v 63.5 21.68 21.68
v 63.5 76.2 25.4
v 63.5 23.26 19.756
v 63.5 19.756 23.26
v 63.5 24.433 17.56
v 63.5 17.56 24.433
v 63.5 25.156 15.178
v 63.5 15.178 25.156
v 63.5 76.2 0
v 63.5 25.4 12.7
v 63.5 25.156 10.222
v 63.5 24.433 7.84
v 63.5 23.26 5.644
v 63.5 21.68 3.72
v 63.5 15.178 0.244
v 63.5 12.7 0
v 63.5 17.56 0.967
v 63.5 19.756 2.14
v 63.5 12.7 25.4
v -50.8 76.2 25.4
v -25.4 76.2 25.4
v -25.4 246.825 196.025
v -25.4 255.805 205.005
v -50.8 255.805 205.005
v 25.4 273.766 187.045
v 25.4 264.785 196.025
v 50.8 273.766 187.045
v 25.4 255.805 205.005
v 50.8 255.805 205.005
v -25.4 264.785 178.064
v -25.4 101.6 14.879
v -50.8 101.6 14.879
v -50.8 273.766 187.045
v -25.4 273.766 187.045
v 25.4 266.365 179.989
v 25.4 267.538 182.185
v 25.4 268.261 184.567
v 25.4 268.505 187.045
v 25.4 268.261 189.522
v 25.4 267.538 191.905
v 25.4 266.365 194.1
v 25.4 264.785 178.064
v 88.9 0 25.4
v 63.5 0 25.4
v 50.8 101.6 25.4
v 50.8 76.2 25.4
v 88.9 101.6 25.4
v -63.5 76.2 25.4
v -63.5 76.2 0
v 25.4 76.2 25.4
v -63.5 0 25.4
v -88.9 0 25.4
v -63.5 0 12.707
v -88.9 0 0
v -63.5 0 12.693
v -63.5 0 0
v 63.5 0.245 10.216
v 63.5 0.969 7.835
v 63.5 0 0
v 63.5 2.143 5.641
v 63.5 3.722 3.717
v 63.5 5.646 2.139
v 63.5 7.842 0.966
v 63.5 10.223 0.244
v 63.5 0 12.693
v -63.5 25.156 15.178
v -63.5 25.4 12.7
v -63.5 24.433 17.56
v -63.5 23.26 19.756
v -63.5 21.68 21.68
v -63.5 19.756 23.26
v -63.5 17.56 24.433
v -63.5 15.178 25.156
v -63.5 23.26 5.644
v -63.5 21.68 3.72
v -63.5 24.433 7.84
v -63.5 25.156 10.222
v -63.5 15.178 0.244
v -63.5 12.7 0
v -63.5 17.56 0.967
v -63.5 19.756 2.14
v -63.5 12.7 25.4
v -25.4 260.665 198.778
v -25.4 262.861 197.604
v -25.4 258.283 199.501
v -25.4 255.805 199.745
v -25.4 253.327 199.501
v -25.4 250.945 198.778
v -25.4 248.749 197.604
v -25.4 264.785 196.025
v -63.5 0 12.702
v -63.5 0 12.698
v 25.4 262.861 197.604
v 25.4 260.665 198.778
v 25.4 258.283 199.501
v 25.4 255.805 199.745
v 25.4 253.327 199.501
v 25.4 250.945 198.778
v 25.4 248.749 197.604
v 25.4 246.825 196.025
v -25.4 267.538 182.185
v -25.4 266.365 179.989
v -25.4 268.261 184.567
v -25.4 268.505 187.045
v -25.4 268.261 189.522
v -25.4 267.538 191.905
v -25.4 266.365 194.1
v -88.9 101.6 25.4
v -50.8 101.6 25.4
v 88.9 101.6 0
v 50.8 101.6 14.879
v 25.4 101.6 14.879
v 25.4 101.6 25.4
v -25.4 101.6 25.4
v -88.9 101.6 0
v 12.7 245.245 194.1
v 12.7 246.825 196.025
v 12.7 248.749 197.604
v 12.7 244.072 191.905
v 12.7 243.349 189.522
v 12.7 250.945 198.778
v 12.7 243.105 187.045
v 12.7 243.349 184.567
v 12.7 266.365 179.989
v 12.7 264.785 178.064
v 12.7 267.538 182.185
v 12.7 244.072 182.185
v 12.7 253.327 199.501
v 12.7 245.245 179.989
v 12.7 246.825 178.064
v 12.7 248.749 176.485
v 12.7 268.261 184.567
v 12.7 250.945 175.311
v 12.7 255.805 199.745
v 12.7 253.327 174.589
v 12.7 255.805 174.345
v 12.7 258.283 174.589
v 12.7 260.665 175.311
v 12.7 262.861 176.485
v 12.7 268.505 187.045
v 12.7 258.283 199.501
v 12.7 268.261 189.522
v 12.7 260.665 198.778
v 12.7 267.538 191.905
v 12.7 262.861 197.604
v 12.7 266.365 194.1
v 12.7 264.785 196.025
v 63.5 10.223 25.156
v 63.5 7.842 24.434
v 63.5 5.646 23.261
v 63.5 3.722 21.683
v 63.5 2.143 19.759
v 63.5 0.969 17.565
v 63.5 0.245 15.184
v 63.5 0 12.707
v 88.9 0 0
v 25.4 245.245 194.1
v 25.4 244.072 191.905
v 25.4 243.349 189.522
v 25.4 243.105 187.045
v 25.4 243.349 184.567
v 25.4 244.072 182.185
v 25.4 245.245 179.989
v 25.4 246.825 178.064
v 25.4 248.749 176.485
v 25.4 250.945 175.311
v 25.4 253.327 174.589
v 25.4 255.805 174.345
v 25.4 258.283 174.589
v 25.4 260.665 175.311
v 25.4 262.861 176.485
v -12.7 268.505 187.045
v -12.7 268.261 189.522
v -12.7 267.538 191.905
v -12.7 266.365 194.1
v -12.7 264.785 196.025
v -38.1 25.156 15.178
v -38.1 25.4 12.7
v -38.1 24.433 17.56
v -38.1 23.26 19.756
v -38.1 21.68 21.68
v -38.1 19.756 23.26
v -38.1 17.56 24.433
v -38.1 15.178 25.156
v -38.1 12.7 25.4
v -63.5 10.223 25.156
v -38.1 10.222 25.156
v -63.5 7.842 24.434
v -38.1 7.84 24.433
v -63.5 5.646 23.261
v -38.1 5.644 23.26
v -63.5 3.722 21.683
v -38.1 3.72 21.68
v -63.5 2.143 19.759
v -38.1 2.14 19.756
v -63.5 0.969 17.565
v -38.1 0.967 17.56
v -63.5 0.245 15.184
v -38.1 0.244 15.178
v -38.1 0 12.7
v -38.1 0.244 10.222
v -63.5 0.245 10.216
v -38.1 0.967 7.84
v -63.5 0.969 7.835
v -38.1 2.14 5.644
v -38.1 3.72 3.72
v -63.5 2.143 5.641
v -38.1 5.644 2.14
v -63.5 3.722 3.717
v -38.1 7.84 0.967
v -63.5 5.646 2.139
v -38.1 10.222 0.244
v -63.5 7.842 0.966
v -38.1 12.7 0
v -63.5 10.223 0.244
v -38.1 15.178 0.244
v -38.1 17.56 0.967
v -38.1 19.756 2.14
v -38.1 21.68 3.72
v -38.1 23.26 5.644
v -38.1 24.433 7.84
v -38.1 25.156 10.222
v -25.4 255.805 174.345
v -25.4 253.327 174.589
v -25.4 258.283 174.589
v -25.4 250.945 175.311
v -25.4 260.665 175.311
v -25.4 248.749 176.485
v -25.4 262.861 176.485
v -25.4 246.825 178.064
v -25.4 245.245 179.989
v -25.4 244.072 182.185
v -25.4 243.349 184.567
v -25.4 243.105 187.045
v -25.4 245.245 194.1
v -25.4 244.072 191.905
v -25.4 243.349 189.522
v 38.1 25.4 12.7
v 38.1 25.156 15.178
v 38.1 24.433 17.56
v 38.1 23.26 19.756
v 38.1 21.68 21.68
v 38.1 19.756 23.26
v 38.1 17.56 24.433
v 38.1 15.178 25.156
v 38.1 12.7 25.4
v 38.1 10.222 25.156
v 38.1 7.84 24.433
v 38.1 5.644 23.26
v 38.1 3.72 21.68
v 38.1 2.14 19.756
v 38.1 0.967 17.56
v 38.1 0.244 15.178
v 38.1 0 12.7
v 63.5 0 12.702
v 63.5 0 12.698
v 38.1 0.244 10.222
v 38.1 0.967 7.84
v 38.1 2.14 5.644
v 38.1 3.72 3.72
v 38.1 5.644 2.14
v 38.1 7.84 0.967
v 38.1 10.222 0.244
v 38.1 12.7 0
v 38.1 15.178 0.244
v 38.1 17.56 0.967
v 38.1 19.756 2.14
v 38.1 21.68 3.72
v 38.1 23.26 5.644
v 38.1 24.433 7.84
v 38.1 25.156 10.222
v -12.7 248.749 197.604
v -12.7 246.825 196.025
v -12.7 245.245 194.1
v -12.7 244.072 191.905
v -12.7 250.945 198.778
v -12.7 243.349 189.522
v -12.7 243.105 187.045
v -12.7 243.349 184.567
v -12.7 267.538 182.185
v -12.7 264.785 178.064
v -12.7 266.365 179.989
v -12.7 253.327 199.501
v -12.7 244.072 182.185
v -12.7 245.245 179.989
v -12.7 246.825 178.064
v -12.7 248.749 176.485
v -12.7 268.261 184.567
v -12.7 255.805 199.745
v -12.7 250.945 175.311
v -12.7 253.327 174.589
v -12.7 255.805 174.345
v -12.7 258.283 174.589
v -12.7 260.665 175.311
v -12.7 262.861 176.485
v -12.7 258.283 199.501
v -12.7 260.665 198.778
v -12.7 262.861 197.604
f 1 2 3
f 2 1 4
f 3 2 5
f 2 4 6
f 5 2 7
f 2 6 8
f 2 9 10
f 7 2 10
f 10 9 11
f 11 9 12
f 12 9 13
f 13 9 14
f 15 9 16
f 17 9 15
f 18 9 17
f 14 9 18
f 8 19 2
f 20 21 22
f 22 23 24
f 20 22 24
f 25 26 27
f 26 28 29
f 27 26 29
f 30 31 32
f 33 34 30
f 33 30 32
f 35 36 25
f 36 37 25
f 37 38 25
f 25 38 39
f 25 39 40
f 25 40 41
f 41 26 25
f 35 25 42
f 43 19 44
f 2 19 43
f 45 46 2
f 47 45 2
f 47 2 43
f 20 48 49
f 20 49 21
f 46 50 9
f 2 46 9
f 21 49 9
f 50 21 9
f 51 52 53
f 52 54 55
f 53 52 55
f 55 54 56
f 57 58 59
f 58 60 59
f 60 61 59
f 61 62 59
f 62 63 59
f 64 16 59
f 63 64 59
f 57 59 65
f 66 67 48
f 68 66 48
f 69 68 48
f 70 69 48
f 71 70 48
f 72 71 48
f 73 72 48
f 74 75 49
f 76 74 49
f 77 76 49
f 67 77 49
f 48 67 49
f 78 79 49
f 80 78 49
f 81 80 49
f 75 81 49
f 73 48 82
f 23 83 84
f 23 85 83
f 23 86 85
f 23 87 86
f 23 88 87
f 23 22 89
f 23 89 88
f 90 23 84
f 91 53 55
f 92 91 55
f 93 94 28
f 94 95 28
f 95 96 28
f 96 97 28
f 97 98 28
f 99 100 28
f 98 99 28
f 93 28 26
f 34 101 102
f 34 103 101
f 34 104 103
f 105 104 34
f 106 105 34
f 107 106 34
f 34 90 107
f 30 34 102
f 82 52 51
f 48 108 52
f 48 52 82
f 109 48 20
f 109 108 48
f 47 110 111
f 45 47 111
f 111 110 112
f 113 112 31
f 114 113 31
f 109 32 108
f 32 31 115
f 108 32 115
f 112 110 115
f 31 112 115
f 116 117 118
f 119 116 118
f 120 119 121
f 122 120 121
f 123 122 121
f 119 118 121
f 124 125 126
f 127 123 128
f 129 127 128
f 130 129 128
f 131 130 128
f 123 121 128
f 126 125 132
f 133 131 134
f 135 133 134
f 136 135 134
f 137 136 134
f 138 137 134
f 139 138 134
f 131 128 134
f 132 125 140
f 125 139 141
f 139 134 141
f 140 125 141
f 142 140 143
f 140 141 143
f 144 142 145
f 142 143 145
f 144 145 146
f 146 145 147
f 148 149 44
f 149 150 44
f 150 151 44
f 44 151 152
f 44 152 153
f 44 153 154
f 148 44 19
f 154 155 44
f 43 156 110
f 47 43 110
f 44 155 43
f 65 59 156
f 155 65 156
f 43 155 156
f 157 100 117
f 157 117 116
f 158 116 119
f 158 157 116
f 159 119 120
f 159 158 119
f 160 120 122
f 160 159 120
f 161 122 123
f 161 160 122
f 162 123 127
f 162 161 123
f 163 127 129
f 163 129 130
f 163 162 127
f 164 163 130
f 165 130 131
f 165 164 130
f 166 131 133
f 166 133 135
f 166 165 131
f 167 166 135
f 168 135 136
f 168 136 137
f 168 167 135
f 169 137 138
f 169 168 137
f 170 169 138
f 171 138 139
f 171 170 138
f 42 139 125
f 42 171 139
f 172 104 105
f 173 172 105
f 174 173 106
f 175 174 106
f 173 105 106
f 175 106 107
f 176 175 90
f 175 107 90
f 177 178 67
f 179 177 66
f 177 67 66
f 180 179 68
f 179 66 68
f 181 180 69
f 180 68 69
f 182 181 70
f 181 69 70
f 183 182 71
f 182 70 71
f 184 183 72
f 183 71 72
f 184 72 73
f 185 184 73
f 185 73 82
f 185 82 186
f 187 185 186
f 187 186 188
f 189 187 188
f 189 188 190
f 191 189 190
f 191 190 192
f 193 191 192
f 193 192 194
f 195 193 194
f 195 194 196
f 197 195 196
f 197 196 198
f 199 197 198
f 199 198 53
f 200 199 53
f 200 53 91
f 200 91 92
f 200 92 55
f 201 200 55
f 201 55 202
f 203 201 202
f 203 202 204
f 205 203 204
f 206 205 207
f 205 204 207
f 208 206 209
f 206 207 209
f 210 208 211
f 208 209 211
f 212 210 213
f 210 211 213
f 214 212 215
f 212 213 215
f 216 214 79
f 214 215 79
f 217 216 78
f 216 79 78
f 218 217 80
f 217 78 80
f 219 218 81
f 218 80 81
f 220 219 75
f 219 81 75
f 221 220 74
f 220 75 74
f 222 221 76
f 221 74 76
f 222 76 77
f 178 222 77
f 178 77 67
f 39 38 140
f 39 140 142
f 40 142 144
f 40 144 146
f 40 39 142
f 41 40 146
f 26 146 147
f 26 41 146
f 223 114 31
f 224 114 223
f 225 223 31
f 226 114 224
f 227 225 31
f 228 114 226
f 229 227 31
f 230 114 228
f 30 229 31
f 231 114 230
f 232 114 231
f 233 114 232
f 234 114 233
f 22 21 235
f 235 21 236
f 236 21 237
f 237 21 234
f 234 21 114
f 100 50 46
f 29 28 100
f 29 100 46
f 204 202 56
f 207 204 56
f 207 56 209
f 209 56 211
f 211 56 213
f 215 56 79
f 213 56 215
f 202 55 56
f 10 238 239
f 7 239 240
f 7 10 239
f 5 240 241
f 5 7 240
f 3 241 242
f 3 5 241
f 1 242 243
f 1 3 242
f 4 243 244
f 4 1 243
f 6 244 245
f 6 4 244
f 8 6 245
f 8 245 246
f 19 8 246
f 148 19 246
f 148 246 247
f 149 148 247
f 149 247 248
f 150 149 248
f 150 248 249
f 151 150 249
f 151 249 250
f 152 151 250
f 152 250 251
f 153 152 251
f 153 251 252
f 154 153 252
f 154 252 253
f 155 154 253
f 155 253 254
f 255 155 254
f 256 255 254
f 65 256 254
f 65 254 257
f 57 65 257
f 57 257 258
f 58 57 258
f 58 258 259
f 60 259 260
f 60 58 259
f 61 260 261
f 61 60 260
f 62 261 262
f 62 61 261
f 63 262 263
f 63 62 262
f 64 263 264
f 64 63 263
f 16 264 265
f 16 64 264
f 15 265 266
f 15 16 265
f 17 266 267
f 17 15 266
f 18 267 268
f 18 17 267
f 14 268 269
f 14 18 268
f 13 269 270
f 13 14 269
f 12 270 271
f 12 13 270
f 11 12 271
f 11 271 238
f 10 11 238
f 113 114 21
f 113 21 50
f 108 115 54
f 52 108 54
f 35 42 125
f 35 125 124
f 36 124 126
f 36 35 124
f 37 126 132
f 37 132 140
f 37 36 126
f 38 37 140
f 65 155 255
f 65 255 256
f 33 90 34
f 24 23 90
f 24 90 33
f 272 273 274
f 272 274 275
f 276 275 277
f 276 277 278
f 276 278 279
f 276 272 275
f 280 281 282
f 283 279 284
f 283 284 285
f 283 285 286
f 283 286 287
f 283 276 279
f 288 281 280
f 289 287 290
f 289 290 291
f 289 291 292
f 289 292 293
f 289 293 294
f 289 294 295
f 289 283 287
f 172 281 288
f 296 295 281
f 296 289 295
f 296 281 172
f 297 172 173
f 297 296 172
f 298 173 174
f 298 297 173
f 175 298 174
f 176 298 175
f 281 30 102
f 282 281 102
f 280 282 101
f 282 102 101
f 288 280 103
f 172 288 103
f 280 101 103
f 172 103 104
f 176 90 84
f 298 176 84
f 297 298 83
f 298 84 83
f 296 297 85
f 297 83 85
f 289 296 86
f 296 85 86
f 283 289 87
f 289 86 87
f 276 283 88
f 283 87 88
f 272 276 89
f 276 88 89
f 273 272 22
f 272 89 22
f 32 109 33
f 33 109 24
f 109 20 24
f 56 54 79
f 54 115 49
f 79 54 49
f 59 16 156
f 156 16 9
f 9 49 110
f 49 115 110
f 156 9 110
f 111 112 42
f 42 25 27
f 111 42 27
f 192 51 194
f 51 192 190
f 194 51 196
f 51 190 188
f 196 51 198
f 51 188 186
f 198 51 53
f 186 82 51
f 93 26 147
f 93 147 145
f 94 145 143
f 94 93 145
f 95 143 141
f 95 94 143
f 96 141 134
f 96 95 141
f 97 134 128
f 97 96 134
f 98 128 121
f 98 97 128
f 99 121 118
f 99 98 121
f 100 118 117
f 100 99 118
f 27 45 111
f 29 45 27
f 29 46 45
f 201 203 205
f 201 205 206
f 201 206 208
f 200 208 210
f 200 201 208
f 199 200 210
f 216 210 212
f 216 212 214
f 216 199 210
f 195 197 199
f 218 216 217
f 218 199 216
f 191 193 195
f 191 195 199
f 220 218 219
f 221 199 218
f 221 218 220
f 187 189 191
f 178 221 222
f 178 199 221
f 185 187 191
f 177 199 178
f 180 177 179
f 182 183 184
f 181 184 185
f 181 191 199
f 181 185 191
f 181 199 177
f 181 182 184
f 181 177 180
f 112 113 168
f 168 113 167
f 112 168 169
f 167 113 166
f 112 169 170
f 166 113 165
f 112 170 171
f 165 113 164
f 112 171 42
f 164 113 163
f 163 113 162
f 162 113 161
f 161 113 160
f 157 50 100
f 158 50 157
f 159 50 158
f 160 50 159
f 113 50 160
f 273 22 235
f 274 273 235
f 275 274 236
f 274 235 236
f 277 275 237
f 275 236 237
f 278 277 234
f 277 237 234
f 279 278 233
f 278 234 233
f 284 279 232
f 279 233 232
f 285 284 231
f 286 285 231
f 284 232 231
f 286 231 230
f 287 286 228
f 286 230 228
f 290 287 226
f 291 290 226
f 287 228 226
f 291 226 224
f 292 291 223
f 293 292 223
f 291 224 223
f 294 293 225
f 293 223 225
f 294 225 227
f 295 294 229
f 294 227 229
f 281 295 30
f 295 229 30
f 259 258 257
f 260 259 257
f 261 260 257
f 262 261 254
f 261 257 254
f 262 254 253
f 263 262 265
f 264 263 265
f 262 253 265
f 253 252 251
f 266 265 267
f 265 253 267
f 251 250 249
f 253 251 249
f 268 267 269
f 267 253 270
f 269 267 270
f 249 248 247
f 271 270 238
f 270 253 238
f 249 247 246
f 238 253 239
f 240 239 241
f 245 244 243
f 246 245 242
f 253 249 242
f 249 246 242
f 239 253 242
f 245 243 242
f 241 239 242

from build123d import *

# Parameters (mm, degrees)
F1_DEPTH = 25.4
F2_R     = 12.7
F3_DEPTH = 25.4
F6_W     = 25.4
F6_H     = 254
F7_DEPTH = 25.4
F9_DEPTH = 12.7


with BuildPart() as f1:
    # F0 (on Top) → F1 (new body)
    with BuildSketch(Plane.XY):
        Polygon((-88.9, 0), (-63.5, 0), (-63.5, 76.2), (0, 76.2), (63.5, 76.2), (63.5, 0), (88.9, 0), (88.9, 101.6), (0, 101.6), (-88.9, 101.6), align=None)
    extrude(amount=F1_DEPTH)

    # F2 (on face) → F3 (join)
    with BuildSketch(Plane.YZ.offset(-63.5)):
        with Locations((12.6999979839, 12.7)):
            Circle(F2_R)
    extrude(amount=F3_DEPTH)

    # F4: F1 across plane


with BuildPart() as f1_1:
    add(f1.part)
    add(f1.part.mirror(Plane.YZ))

    # F6 (on face) → F7 (join)
    with BuildSketch(Plane(origin=(0, 25.4, -25.4), x_dir=(-1, 0, 0), z_dir=(0, 0.7071067812, -0.7071067812))):
        with Locations((38.1, 198.8420489686)):
            Rectangle(F6_W, F6_H)
    extrude(amount=F7_DEPTH)

    # F8 (on face) → F9 (join)
    with BuildSketch(Plane.YZ.offset(-25.4)):
        with BuildLine():
            ThreePointArc((264.7853785425, 178.0643540582), (267.5383924843, 182.1845305882), (268.5051224214, 187.0446101792))
            ThreePointArc((268.5051224214, 187.0446101792), (267.5383924843, 191.9046897703), (264.7853785425, 196.0248663003))
            ThreePointArc((264.7853785425, 196.0248663003), (255.8051224214, 199.7446101792), (246.8248663003, 196.0248663003))
            ThreePointArc((246.8248663003, 196.0248663003), (246.8248663003, 178.0643540582), (264.7853785425, 178.0643540582))
        make_face()
    extrude(amount=F9_DEPTH)

    # F10: F1 across plane


with BuildPart() as f1_2:
    add(f1_1.part)
    add(f1_1.part.mirror(Plane.YZ))


solid = f1_2.part
